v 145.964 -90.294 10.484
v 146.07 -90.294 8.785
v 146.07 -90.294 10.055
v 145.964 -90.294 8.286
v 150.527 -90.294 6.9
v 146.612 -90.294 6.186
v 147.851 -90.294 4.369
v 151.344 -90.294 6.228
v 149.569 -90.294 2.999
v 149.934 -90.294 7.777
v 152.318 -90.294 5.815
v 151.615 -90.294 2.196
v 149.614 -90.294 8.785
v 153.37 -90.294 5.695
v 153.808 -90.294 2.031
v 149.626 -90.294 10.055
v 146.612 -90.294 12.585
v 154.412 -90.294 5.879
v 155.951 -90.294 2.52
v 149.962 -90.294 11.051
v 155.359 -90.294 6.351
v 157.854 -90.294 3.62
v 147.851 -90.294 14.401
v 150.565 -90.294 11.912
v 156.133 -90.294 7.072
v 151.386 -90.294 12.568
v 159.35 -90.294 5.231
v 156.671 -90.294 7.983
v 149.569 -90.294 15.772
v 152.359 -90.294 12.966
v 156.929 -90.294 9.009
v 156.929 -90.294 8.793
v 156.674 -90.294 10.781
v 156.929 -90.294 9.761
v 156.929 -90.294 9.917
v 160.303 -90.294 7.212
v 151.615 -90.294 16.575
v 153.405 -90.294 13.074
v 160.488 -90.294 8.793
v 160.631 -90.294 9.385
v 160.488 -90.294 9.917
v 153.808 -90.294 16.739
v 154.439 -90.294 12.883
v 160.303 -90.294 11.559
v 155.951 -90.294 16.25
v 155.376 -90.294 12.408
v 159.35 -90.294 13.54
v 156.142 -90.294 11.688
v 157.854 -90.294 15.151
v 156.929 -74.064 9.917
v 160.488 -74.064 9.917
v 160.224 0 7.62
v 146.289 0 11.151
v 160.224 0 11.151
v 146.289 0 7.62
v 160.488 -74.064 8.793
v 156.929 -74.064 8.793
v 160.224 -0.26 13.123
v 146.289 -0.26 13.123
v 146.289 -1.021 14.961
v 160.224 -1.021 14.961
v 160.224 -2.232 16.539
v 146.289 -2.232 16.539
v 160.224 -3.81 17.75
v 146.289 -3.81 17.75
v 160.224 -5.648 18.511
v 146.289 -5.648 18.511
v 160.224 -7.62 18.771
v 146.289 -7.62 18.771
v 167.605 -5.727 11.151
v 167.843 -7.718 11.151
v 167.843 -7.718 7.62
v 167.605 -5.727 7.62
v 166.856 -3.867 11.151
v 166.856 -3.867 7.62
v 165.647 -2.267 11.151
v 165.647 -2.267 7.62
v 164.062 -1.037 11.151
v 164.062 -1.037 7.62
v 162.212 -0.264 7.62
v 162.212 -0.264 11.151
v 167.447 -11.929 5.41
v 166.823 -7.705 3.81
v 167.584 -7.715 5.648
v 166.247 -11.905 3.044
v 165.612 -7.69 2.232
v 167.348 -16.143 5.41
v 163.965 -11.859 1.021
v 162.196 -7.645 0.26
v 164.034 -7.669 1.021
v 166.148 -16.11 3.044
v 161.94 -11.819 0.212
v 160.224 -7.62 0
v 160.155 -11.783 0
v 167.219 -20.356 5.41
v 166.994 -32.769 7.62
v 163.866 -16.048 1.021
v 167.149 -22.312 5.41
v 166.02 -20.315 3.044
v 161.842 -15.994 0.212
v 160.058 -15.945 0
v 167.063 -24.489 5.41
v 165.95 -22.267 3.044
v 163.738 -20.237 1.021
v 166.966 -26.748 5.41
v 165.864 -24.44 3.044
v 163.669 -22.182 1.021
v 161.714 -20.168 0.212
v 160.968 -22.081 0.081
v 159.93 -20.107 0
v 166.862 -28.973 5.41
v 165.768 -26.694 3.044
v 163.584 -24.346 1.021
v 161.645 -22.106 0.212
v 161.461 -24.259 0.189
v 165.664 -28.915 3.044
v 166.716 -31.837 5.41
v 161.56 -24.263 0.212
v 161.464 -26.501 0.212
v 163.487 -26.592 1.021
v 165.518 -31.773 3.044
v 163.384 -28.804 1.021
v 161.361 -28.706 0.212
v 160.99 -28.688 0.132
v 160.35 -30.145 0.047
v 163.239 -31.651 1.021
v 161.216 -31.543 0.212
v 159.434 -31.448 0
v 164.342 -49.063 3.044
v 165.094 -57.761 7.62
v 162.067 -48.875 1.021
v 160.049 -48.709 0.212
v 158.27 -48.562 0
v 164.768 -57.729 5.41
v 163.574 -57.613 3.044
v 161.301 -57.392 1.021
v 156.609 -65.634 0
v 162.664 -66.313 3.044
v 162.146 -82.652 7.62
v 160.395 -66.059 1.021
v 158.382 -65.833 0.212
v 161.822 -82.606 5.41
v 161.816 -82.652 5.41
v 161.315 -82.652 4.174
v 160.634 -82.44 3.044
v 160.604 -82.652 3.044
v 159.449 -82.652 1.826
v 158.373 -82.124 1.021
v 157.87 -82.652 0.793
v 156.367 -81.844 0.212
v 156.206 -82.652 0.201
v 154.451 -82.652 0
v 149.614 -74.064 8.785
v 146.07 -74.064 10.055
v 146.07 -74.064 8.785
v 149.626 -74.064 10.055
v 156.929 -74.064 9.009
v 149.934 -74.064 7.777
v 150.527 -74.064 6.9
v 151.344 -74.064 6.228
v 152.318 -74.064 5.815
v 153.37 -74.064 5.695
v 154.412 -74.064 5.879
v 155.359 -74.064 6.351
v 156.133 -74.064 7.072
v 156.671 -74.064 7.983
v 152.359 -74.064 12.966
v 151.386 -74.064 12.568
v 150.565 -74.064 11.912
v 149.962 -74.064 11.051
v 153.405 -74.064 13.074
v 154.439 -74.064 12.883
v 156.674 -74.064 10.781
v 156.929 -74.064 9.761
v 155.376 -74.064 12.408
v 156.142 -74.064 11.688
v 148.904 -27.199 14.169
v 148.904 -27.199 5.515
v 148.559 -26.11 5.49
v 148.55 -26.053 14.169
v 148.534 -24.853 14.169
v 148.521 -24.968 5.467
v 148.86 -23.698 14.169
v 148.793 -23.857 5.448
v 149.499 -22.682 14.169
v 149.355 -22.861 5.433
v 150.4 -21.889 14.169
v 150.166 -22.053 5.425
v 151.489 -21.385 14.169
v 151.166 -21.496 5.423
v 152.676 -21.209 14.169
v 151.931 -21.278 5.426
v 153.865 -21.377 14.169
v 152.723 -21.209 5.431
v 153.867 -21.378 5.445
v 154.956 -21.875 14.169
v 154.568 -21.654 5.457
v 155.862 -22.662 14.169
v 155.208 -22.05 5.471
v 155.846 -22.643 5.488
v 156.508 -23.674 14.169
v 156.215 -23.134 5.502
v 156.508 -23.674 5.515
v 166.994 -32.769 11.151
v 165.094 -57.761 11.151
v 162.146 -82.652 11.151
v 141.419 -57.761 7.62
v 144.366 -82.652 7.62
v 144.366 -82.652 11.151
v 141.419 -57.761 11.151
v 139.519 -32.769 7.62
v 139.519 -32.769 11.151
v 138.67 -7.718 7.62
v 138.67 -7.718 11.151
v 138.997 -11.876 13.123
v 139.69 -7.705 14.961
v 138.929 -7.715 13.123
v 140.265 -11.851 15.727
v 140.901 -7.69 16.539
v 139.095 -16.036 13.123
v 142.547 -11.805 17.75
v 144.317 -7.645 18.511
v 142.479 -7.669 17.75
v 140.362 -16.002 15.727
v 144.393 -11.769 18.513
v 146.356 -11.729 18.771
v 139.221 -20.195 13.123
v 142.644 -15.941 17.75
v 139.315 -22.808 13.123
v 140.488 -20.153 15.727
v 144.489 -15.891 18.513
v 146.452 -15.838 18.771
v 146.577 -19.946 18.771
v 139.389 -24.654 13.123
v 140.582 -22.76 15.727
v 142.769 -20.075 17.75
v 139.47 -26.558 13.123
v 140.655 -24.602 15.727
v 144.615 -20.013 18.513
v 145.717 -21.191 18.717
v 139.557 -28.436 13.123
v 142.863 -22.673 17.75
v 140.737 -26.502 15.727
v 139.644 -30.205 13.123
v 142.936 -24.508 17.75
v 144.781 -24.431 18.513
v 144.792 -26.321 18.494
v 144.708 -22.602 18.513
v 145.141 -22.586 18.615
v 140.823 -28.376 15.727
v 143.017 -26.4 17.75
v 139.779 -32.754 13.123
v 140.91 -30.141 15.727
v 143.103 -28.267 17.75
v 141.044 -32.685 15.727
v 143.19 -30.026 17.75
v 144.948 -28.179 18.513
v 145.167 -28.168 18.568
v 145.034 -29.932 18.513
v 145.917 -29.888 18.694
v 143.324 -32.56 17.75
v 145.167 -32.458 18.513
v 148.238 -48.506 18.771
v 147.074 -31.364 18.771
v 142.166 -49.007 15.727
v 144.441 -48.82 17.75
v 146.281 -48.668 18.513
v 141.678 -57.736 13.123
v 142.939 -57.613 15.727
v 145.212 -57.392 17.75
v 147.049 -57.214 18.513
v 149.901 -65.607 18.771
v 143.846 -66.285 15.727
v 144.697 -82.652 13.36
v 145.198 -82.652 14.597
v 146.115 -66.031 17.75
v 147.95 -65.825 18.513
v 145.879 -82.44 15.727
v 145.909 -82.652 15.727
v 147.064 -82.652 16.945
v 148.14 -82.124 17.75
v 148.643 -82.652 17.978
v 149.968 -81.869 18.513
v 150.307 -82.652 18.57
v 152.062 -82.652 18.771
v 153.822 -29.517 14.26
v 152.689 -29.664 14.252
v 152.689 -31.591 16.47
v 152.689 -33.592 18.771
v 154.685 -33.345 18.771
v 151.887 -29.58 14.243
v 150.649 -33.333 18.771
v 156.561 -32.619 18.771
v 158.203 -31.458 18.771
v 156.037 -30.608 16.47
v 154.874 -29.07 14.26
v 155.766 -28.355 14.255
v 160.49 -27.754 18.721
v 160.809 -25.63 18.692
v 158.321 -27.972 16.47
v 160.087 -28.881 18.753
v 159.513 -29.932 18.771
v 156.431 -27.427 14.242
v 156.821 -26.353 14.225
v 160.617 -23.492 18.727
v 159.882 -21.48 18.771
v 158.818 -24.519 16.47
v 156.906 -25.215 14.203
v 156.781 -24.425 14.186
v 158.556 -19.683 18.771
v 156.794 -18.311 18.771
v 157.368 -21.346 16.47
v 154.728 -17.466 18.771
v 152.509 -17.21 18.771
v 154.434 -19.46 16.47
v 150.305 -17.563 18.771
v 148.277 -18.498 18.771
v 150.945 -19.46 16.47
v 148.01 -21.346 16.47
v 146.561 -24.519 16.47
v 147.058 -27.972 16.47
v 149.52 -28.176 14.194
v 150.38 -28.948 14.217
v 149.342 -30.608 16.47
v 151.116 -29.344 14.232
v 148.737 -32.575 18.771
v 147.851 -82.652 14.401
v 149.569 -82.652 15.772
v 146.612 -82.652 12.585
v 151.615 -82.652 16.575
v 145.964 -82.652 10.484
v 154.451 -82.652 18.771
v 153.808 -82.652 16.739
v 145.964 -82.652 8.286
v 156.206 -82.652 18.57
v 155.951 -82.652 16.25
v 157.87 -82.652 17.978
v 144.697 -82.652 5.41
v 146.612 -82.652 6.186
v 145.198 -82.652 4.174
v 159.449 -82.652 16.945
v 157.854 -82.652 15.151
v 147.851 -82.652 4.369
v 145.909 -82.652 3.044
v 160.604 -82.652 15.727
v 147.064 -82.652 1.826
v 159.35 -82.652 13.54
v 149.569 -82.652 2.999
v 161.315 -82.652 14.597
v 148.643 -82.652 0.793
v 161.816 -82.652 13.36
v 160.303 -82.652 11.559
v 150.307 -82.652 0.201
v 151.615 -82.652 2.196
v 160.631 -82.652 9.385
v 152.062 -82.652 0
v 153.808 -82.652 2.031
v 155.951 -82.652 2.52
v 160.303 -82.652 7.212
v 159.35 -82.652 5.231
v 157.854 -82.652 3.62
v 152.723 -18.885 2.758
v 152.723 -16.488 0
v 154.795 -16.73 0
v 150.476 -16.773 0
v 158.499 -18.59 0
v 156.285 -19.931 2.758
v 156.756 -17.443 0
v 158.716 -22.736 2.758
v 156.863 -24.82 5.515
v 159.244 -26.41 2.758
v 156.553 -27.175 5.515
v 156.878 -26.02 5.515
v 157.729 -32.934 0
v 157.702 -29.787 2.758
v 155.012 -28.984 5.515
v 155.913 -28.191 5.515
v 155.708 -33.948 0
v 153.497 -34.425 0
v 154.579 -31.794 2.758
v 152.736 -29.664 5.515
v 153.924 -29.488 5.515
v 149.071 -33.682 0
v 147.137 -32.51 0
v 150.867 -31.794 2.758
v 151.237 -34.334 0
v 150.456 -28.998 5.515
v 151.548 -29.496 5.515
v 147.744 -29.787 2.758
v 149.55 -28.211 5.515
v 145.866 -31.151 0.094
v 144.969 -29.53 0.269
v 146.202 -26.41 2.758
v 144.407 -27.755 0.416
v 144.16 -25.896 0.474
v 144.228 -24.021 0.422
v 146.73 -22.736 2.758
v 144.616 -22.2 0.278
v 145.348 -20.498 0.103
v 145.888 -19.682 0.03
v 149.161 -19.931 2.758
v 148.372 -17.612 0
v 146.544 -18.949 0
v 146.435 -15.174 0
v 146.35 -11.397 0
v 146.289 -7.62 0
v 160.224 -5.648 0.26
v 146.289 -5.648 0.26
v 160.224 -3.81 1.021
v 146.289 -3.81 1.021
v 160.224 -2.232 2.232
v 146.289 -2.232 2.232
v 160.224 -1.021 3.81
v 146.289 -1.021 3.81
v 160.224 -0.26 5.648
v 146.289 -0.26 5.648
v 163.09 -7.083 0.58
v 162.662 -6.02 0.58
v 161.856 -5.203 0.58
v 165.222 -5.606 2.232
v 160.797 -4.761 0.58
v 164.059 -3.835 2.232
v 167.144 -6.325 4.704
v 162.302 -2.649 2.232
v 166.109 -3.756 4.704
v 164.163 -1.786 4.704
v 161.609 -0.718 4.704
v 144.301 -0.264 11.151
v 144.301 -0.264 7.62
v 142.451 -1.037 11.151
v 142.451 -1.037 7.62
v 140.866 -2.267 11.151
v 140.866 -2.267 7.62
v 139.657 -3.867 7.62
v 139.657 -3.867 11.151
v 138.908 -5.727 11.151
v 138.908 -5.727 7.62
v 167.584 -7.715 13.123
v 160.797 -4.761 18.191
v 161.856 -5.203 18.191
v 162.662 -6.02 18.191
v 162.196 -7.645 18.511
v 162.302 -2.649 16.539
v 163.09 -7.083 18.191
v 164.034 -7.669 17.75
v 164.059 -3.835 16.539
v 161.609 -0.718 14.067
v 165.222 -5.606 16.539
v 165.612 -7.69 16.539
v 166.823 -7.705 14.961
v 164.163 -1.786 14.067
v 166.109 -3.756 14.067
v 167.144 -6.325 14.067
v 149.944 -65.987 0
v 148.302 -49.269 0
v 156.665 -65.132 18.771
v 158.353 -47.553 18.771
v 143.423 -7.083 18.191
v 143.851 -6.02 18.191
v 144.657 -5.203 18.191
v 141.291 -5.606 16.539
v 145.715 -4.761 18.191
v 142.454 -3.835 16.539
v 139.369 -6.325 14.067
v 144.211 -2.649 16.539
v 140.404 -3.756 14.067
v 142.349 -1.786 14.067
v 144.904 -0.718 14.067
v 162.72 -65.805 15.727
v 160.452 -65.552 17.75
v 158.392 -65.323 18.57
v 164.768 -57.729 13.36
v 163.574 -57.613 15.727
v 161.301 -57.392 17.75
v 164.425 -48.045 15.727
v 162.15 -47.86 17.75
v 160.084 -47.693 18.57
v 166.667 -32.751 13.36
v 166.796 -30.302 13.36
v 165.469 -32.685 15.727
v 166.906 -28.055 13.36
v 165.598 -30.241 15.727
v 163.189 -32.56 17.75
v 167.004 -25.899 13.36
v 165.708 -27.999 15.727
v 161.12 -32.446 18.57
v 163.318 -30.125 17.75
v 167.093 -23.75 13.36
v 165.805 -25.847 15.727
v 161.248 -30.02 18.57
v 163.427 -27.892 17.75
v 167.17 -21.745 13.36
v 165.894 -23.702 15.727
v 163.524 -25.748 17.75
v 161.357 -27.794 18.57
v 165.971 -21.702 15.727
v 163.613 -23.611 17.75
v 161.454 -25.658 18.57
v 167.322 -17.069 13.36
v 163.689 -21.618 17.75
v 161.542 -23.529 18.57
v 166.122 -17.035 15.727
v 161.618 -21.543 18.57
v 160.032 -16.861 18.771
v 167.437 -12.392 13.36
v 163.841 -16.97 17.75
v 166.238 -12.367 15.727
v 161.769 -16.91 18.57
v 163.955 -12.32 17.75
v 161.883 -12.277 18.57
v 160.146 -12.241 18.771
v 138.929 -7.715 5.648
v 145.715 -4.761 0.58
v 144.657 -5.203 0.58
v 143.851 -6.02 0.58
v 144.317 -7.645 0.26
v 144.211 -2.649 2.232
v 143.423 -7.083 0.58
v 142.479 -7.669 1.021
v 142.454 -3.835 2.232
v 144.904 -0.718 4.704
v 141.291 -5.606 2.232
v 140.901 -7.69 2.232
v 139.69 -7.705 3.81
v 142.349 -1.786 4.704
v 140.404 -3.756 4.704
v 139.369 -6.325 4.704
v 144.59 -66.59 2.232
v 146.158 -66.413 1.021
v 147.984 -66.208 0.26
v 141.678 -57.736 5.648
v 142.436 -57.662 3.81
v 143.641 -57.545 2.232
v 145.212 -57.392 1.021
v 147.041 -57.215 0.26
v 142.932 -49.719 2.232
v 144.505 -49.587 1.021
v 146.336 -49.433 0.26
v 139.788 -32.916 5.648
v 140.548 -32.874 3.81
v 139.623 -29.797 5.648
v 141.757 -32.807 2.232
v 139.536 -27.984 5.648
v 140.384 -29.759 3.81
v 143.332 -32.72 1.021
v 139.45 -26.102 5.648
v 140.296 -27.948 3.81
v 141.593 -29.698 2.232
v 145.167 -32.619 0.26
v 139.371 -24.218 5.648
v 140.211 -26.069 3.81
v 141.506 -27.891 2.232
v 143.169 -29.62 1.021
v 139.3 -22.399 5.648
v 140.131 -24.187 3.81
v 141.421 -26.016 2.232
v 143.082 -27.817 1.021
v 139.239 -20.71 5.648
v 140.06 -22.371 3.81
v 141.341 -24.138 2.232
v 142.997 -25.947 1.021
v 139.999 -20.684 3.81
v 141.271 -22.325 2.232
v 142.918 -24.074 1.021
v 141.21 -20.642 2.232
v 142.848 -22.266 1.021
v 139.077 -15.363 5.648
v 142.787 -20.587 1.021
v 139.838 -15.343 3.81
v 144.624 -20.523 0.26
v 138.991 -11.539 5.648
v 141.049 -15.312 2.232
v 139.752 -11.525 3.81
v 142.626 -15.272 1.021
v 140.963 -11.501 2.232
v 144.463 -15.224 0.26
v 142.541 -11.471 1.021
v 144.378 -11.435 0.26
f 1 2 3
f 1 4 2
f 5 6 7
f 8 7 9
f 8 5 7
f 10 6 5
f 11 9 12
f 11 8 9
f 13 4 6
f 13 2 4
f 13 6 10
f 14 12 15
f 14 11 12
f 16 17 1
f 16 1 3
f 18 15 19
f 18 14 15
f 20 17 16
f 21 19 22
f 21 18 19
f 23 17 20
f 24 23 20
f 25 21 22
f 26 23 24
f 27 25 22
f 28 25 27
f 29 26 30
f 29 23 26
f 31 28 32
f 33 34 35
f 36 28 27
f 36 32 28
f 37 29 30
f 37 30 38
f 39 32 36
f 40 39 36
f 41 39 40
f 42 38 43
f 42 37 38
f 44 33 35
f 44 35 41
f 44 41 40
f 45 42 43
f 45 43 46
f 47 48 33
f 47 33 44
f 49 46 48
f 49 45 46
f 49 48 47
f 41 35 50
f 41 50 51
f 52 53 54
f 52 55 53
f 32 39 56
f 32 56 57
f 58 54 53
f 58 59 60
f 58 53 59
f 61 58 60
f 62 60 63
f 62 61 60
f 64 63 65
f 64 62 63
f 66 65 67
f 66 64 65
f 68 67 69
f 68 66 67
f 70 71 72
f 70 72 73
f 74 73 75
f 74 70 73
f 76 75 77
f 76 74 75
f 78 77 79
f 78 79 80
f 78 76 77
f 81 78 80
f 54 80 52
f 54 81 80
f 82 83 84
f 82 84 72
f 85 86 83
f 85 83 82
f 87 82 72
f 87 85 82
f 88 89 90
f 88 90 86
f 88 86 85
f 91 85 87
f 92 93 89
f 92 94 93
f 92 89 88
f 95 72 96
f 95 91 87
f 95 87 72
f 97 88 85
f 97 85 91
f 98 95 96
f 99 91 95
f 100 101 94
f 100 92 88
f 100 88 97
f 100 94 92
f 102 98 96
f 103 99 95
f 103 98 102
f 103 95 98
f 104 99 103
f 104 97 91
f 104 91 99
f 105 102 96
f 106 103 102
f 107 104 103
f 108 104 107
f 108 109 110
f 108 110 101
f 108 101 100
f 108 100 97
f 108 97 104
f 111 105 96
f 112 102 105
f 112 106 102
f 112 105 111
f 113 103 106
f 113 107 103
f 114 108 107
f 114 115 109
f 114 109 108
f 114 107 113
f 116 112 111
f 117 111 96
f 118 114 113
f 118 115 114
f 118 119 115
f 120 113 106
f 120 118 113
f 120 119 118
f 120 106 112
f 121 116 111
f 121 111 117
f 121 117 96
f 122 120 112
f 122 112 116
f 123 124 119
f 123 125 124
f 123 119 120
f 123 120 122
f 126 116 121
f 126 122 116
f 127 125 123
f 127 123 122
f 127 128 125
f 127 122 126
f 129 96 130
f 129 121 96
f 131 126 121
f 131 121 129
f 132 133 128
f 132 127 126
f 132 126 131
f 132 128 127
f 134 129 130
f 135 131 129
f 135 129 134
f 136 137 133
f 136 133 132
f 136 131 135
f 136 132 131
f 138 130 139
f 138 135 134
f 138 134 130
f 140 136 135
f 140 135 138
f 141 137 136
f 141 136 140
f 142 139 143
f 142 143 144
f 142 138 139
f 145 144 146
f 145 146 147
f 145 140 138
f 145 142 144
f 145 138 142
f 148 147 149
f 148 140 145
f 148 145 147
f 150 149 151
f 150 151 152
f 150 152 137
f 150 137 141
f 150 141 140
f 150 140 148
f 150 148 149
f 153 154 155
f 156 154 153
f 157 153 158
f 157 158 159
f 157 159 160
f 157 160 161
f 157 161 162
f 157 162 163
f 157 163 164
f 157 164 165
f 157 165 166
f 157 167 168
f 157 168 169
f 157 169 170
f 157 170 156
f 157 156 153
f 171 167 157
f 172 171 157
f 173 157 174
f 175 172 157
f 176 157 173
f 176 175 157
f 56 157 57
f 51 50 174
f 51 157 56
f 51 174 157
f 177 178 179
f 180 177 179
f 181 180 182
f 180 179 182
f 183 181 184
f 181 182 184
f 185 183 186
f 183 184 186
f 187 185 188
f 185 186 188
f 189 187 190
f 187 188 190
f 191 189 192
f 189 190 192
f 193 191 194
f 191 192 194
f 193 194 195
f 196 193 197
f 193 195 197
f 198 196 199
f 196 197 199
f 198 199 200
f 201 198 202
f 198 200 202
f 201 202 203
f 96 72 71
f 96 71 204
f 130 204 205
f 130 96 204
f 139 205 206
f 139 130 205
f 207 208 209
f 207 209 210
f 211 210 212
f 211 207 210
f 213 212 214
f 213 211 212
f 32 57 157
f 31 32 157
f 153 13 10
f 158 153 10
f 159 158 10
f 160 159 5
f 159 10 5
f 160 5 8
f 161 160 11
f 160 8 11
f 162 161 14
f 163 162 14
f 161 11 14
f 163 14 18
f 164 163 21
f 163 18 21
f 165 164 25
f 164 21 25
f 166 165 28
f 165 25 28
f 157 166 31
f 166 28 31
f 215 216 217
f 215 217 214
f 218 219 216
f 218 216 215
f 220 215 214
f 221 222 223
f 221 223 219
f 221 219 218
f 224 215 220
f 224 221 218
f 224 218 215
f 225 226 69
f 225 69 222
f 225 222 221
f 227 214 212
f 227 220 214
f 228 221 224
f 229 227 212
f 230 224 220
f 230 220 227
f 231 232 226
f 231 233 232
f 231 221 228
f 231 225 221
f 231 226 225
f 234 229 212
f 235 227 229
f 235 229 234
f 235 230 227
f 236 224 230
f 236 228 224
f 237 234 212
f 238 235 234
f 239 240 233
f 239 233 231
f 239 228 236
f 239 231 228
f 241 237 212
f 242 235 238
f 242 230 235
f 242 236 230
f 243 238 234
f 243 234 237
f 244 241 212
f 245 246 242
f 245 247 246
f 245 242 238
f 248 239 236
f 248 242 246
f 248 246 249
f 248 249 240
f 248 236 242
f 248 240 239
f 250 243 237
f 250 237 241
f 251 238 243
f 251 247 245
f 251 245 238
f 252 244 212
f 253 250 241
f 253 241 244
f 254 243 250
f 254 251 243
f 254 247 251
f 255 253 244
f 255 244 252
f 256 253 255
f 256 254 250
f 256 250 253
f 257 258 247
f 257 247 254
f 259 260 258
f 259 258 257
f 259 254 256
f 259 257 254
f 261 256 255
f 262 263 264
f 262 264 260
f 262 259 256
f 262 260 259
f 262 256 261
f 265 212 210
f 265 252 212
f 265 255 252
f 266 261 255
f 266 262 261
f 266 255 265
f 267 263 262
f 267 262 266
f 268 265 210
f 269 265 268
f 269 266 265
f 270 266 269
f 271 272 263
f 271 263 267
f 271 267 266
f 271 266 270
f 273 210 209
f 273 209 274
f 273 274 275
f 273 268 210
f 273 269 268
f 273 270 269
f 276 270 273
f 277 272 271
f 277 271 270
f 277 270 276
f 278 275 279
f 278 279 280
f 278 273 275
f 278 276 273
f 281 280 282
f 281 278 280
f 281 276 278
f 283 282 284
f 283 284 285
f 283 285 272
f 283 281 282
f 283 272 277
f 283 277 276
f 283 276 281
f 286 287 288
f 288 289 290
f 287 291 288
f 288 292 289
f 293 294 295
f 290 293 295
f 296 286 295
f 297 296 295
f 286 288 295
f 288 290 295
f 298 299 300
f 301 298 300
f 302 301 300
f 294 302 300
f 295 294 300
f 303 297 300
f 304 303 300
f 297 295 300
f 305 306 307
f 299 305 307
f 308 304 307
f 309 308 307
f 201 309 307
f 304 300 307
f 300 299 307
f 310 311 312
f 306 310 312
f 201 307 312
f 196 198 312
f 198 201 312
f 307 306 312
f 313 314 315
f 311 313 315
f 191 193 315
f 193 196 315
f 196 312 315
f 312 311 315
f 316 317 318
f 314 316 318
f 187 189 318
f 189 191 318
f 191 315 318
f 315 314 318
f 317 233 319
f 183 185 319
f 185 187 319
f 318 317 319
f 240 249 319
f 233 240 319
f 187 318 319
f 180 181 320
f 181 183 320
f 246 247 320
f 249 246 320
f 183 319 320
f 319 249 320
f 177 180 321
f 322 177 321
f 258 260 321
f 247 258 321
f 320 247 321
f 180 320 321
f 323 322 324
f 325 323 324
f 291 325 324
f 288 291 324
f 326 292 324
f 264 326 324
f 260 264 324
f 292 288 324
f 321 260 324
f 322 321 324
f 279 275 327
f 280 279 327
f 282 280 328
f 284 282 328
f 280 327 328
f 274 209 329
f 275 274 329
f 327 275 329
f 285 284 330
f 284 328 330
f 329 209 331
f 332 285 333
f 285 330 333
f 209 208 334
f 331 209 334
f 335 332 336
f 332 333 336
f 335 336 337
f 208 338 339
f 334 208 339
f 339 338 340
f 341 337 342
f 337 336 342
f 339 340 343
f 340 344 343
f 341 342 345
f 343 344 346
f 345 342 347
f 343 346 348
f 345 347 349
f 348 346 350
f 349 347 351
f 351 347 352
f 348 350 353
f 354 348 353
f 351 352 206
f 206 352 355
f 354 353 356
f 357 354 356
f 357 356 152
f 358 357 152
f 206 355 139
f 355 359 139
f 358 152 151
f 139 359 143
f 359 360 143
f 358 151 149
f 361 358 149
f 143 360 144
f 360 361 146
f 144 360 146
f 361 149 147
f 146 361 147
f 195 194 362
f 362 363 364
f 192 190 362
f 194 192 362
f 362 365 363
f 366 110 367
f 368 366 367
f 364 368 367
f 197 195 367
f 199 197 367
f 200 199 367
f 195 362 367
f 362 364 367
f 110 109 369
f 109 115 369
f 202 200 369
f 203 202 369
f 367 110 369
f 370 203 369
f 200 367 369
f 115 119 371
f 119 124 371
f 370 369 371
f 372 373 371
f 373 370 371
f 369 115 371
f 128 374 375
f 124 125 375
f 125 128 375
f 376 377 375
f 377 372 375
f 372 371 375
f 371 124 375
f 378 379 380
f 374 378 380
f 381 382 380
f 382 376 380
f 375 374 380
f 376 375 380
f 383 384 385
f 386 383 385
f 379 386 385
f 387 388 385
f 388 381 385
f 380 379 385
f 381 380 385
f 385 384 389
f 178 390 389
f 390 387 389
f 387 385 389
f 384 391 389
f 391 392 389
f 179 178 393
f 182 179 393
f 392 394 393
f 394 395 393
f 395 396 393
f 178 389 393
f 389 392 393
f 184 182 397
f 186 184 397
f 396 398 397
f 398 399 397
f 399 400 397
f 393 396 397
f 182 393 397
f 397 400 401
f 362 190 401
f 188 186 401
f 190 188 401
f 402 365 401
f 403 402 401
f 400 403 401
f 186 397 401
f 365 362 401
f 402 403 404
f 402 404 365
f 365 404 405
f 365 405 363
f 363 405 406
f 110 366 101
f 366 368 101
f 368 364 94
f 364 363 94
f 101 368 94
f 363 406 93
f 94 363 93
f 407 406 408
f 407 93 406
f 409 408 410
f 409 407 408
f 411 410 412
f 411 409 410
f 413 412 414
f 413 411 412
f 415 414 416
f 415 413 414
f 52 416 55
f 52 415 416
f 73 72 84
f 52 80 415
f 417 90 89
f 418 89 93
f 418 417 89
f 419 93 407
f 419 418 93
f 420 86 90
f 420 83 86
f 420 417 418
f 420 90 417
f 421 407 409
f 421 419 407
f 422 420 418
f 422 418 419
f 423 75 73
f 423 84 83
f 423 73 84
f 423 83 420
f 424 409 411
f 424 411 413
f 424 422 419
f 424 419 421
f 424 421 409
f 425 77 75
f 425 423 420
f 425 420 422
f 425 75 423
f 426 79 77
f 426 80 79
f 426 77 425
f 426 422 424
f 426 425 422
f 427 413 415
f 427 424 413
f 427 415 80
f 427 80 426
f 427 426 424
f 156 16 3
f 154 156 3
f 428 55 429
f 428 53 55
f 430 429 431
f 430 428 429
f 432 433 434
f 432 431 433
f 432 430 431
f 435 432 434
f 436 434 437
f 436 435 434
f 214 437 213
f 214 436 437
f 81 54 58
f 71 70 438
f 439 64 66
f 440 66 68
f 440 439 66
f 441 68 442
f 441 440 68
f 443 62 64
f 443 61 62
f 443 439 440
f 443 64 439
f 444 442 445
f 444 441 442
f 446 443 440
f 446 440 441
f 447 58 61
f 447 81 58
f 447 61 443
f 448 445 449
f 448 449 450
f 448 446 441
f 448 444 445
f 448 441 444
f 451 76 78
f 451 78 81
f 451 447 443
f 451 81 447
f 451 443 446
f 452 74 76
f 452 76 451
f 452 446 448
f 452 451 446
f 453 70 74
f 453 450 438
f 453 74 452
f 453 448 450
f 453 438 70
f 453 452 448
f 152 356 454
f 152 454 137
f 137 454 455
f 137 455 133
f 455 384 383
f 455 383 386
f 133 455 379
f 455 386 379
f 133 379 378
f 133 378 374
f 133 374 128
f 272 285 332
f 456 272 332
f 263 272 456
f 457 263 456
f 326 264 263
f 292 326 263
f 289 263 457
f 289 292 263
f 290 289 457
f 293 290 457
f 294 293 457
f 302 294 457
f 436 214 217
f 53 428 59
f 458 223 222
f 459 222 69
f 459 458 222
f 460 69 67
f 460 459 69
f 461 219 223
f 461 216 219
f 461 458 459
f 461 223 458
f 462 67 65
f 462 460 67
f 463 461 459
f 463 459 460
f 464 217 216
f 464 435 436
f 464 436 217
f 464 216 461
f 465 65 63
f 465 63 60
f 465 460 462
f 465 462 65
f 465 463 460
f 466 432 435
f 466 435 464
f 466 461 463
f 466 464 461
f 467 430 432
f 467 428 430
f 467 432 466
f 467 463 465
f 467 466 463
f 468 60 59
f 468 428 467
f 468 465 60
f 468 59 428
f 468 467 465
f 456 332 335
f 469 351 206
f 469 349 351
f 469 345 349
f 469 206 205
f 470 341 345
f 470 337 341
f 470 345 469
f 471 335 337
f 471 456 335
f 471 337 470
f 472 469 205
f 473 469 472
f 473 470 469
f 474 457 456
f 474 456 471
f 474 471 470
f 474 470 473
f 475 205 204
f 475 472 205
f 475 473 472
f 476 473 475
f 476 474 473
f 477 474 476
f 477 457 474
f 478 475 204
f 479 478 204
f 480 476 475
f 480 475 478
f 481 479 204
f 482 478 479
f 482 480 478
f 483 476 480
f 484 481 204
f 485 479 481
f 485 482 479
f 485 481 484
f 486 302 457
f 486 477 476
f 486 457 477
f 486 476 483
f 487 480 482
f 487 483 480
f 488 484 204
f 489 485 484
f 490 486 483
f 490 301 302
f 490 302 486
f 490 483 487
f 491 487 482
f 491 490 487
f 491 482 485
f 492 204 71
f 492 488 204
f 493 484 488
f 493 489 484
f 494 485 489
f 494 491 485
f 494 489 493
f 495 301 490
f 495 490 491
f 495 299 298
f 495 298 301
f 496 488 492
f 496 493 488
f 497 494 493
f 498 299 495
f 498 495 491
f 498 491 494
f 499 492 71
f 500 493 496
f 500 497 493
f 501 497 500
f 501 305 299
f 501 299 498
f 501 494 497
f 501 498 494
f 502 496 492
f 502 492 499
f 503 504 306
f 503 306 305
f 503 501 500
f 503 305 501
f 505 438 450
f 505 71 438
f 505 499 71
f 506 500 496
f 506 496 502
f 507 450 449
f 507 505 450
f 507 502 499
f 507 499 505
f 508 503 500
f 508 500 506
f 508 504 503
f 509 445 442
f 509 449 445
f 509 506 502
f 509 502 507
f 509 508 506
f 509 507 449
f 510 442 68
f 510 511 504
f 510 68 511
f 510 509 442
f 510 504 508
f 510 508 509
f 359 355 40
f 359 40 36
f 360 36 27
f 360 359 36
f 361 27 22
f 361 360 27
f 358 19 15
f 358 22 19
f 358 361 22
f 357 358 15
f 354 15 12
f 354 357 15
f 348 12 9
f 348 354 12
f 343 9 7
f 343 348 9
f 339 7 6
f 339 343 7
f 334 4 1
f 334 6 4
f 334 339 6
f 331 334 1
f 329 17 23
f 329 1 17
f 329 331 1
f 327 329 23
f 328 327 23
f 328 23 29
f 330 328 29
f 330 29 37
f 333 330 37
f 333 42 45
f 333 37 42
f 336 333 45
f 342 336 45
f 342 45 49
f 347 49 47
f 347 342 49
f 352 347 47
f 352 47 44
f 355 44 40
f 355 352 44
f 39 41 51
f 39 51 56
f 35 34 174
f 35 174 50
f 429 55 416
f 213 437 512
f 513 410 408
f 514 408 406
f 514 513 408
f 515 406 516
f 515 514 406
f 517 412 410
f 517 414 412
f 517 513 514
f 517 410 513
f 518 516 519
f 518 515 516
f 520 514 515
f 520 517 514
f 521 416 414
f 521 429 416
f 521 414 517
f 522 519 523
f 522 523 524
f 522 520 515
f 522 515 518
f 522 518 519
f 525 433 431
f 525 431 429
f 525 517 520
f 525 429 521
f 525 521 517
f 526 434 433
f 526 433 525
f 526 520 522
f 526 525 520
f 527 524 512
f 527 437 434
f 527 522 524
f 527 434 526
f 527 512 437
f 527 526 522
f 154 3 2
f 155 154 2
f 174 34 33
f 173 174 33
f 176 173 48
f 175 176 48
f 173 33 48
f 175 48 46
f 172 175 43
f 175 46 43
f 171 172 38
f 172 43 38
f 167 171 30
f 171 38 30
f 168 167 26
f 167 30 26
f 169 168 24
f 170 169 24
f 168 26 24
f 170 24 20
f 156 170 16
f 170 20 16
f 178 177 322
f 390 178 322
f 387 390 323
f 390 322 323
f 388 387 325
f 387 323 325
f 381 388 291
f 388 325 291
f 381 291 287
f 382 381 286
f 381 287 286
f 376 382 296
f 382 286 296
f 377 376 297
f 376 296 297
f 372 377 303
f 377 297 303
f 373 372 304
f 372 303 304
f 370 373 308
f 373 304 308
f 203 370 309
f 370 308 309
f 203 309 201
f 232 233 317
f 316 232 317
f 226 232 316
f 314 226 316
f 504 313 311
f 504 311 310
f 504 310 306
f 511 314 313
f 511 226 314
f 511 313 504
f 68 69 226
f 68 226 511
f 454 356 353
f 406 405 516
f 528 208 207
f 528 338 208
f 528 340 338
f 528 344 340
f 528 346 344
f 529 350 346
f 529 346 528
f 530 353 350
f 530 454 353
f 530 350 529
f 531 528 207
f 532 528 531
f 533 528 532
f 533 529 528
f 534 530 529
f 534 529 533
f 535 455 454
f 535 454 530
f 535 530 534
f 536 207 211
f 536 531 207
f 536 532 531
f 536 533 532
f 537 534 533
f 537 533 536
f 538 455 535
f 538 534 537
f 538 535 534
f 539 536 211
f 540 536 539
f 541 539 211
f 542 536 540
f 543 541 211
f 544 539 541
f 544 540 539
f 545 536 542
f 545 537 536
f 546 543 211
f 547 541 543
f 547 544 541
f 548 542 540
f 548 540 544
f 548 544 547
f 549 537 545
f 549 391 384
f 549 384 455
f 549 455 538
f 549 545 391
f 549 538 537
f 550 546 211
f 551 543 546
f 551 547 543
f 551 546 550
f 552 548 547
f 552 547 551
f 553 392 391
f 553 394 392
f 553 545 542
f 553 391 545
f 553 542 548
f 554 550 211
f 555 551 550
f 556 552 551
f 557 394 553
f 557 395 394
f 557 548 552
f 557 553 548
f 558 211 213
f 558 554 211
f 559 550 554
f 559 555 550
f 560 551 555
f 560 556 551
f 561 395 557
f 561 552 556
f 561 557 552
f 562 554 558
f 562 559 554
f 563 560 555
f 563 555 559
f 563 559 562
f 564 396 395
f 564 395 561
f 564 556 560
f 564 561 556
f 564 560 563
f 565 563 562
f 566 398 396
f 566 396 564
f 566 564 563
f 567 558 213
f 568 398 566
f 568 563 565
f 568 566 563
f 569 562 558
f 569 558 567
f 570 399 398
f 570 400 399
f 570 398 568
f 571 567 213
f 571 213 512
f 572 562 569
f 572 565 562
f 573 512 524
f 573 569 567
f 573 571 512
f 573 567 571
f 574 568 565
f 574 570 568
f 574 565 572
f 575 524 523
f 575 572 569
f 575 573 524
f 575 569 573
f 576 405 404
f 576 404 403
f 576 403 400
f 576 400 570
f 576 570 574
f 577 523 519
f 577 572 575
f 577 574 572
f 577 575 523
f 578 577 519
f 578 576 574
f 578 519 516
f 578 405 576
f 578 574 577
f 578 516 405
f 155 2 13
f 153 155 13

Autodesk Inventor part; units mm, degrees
ref_plane "YZ Plane" through (0, 0, 0) normal (1, 0, 0) x (0, 1, 0)
ref_plane "XZ Plane" through (0, 0, 0) normal (0, 1, 0) x (-1, 0, 0)
sketch "Sketch1" plane through (0, 0, 0) normal (0, 0, 1) x (1, 0, 0)
  line L0 (138.6197, 0) -> (167.8932, 0)
  line L1 (144.3665, -82.6516) -> (162.1465, -82.6516)
  arc A0 (162.1465, -82.6516) -> (167.8932, 0) centre (-429.3411, 0) ccw
  arc A1 (138.6197, 0) -> (144.3665, -82.6516) centre (735.854, 0) ccw
  point P0 (0, 0)
  point P1 (161.6207, -82.6516)
  point P2 (153.734, -82.6516)
  dimension "d0" = 29.2735
  dimension "d2" = 17.78
extrude "Extrusion1" add sketch "Sketch1" along normal blind 18.7706
fillet "Fillet1" radius 7.62 8 edges at (140.0581, -41.4256, 18.7706) (166.4548, -41.4256, 18.7706) (153.2565, 0, 18.7706) (153.2565, 0, 0) (138.6197, 0, 9.3853) (167.8932, 0, 9.3853) (140.0581, -41.4256, 0) (166.4548, -41.4256, 0)
sketch "Sketch2" plane through (152.0615, -82.6516, 18.7706) normal (0, -1, 0) x (1, 0, 0)
  line L0 (10.085, -11.1506) -> (10.085, -7.62) projected
  line L1 (10.085, -9.3853) -> (-7.695, -9.3853)
  line L2 (-7.695, -11.1506) -> (-7.695, -7.62) projected
  point P0 (-152.0615, -18.7706)
ref_plane "Work Plane1" through (162.1465, -82.6516, 9.3853) normal (0, 0, 1) x (-1, 0, 0)
sketch "Sketch3" plane through (162.1465, -82.6516, 9.3853) normal (0, 0, 1) x (-1, 0, 0)
  arc A0 (0, 0) -> (-5.6969, -74.9331) centre (591.4875, -82.6516) ccw projected
  line L0 (1.5154, 7.6425) -> (1.5154, 0)
  arc A1 (0, 0) -> (-5.6969, -74.9331) centre (591.4875, -82.6516) ccw projected
  line L1 (-5.6969, -74.9331) -> (8.89, 0)
  line L2 (8.89, 0) -> (8.89, 7.6425)
  line L3 (1.5154, 7.6425) -> (8.89, 7.6425)
  line L4 (8.89, 0) -> (0, 0)
  point P0 (162.1465, -82.6516)
  dimension "d14" = 76.3397
revolve "Revolution2" add sketch "Sketch3" angle 360 about axis through (153.2565, -82.6516, 9.3853) along (0, -1, 0) contours L0 L3 L2 L4
sketch "Sketch4" plane through (153.2565, -90.2941, 9.3853) normal (0, -1, 0) x (1, 0, 0)
  circle A0 centre (0, 0) radius 3.6916
  circle A1 centre (0, 0) radius 7.3746 projected
  line L0 (-3.6303, 0.6699) -> (-7.186, 0.6699)
  line L1 (-7.186, 0.6699) -> (-7.186, -0.6001)
  line L2 (-7.186, -0.6001) -> (-3.6303, -0.6001)
  line L3 (-3.6303, -0.6001) -> (-3.6303, 0.6699)
  line L4 (3.6724, 0.5316) -> (7.2319, 0.5316)
  line L5 (7.2319, 0.5316) -> (7.2319, -0.5919)
  line L6 (7.2319, -0.5919) -> (3.6724, -0.5919)
  line L7 (3.6724, -0.5919) -> (3.6724, 0.5316)
  point P0 (-153.2565, -9.3853)
  dimension "d17" = 3.683
  dimension "d18" = 1.27
extrude "Extrusion2" cut sketch "Sketch4" against normal blind 16.2306 contours A0 L7 | A0 L7 L4 L5 L6 | L7 A0 L2 L3 | L3 L2 A0 | A0 L2 L1 L0
sketch "Sketch5" plane through (0, 0, 18.7706) normal (0, 0, 1) x (1, 0, 0)
  line L0 (160.224, 0) -> (146.289, 0) projected
  line L1 (152.6894, 0) -> (178.0894, 0) construction
  circle A0 centre (152.6894, -25.4) radius 8.3376
  point P0 (0, 0)
  dimension "d23" = 16.6751
hole "Hole1" at (152.6894, -25.4, 18.7706) direction (0, 0, -1) diameter 8.382 end through all countersink diameter 16.383 countersink angle 82
sketch "Sketch6" plane through (0, 0, 0) normal (0, 0, -1) x (-1, 0, 0)
  line L0 (-160.224, 0) -> (-146.289, 0) projected
  line L1 (-153.2565, 0) -> (-152.7232, -25.4729)
  point P0 (0, 0)
hole "Hole2" at (152.7232, -25.4729, 0) direction (0, 0, 1) diameter 8.382 end through all countersink diameter 17.9705 countersink angle 82
properties part number "dis3"
